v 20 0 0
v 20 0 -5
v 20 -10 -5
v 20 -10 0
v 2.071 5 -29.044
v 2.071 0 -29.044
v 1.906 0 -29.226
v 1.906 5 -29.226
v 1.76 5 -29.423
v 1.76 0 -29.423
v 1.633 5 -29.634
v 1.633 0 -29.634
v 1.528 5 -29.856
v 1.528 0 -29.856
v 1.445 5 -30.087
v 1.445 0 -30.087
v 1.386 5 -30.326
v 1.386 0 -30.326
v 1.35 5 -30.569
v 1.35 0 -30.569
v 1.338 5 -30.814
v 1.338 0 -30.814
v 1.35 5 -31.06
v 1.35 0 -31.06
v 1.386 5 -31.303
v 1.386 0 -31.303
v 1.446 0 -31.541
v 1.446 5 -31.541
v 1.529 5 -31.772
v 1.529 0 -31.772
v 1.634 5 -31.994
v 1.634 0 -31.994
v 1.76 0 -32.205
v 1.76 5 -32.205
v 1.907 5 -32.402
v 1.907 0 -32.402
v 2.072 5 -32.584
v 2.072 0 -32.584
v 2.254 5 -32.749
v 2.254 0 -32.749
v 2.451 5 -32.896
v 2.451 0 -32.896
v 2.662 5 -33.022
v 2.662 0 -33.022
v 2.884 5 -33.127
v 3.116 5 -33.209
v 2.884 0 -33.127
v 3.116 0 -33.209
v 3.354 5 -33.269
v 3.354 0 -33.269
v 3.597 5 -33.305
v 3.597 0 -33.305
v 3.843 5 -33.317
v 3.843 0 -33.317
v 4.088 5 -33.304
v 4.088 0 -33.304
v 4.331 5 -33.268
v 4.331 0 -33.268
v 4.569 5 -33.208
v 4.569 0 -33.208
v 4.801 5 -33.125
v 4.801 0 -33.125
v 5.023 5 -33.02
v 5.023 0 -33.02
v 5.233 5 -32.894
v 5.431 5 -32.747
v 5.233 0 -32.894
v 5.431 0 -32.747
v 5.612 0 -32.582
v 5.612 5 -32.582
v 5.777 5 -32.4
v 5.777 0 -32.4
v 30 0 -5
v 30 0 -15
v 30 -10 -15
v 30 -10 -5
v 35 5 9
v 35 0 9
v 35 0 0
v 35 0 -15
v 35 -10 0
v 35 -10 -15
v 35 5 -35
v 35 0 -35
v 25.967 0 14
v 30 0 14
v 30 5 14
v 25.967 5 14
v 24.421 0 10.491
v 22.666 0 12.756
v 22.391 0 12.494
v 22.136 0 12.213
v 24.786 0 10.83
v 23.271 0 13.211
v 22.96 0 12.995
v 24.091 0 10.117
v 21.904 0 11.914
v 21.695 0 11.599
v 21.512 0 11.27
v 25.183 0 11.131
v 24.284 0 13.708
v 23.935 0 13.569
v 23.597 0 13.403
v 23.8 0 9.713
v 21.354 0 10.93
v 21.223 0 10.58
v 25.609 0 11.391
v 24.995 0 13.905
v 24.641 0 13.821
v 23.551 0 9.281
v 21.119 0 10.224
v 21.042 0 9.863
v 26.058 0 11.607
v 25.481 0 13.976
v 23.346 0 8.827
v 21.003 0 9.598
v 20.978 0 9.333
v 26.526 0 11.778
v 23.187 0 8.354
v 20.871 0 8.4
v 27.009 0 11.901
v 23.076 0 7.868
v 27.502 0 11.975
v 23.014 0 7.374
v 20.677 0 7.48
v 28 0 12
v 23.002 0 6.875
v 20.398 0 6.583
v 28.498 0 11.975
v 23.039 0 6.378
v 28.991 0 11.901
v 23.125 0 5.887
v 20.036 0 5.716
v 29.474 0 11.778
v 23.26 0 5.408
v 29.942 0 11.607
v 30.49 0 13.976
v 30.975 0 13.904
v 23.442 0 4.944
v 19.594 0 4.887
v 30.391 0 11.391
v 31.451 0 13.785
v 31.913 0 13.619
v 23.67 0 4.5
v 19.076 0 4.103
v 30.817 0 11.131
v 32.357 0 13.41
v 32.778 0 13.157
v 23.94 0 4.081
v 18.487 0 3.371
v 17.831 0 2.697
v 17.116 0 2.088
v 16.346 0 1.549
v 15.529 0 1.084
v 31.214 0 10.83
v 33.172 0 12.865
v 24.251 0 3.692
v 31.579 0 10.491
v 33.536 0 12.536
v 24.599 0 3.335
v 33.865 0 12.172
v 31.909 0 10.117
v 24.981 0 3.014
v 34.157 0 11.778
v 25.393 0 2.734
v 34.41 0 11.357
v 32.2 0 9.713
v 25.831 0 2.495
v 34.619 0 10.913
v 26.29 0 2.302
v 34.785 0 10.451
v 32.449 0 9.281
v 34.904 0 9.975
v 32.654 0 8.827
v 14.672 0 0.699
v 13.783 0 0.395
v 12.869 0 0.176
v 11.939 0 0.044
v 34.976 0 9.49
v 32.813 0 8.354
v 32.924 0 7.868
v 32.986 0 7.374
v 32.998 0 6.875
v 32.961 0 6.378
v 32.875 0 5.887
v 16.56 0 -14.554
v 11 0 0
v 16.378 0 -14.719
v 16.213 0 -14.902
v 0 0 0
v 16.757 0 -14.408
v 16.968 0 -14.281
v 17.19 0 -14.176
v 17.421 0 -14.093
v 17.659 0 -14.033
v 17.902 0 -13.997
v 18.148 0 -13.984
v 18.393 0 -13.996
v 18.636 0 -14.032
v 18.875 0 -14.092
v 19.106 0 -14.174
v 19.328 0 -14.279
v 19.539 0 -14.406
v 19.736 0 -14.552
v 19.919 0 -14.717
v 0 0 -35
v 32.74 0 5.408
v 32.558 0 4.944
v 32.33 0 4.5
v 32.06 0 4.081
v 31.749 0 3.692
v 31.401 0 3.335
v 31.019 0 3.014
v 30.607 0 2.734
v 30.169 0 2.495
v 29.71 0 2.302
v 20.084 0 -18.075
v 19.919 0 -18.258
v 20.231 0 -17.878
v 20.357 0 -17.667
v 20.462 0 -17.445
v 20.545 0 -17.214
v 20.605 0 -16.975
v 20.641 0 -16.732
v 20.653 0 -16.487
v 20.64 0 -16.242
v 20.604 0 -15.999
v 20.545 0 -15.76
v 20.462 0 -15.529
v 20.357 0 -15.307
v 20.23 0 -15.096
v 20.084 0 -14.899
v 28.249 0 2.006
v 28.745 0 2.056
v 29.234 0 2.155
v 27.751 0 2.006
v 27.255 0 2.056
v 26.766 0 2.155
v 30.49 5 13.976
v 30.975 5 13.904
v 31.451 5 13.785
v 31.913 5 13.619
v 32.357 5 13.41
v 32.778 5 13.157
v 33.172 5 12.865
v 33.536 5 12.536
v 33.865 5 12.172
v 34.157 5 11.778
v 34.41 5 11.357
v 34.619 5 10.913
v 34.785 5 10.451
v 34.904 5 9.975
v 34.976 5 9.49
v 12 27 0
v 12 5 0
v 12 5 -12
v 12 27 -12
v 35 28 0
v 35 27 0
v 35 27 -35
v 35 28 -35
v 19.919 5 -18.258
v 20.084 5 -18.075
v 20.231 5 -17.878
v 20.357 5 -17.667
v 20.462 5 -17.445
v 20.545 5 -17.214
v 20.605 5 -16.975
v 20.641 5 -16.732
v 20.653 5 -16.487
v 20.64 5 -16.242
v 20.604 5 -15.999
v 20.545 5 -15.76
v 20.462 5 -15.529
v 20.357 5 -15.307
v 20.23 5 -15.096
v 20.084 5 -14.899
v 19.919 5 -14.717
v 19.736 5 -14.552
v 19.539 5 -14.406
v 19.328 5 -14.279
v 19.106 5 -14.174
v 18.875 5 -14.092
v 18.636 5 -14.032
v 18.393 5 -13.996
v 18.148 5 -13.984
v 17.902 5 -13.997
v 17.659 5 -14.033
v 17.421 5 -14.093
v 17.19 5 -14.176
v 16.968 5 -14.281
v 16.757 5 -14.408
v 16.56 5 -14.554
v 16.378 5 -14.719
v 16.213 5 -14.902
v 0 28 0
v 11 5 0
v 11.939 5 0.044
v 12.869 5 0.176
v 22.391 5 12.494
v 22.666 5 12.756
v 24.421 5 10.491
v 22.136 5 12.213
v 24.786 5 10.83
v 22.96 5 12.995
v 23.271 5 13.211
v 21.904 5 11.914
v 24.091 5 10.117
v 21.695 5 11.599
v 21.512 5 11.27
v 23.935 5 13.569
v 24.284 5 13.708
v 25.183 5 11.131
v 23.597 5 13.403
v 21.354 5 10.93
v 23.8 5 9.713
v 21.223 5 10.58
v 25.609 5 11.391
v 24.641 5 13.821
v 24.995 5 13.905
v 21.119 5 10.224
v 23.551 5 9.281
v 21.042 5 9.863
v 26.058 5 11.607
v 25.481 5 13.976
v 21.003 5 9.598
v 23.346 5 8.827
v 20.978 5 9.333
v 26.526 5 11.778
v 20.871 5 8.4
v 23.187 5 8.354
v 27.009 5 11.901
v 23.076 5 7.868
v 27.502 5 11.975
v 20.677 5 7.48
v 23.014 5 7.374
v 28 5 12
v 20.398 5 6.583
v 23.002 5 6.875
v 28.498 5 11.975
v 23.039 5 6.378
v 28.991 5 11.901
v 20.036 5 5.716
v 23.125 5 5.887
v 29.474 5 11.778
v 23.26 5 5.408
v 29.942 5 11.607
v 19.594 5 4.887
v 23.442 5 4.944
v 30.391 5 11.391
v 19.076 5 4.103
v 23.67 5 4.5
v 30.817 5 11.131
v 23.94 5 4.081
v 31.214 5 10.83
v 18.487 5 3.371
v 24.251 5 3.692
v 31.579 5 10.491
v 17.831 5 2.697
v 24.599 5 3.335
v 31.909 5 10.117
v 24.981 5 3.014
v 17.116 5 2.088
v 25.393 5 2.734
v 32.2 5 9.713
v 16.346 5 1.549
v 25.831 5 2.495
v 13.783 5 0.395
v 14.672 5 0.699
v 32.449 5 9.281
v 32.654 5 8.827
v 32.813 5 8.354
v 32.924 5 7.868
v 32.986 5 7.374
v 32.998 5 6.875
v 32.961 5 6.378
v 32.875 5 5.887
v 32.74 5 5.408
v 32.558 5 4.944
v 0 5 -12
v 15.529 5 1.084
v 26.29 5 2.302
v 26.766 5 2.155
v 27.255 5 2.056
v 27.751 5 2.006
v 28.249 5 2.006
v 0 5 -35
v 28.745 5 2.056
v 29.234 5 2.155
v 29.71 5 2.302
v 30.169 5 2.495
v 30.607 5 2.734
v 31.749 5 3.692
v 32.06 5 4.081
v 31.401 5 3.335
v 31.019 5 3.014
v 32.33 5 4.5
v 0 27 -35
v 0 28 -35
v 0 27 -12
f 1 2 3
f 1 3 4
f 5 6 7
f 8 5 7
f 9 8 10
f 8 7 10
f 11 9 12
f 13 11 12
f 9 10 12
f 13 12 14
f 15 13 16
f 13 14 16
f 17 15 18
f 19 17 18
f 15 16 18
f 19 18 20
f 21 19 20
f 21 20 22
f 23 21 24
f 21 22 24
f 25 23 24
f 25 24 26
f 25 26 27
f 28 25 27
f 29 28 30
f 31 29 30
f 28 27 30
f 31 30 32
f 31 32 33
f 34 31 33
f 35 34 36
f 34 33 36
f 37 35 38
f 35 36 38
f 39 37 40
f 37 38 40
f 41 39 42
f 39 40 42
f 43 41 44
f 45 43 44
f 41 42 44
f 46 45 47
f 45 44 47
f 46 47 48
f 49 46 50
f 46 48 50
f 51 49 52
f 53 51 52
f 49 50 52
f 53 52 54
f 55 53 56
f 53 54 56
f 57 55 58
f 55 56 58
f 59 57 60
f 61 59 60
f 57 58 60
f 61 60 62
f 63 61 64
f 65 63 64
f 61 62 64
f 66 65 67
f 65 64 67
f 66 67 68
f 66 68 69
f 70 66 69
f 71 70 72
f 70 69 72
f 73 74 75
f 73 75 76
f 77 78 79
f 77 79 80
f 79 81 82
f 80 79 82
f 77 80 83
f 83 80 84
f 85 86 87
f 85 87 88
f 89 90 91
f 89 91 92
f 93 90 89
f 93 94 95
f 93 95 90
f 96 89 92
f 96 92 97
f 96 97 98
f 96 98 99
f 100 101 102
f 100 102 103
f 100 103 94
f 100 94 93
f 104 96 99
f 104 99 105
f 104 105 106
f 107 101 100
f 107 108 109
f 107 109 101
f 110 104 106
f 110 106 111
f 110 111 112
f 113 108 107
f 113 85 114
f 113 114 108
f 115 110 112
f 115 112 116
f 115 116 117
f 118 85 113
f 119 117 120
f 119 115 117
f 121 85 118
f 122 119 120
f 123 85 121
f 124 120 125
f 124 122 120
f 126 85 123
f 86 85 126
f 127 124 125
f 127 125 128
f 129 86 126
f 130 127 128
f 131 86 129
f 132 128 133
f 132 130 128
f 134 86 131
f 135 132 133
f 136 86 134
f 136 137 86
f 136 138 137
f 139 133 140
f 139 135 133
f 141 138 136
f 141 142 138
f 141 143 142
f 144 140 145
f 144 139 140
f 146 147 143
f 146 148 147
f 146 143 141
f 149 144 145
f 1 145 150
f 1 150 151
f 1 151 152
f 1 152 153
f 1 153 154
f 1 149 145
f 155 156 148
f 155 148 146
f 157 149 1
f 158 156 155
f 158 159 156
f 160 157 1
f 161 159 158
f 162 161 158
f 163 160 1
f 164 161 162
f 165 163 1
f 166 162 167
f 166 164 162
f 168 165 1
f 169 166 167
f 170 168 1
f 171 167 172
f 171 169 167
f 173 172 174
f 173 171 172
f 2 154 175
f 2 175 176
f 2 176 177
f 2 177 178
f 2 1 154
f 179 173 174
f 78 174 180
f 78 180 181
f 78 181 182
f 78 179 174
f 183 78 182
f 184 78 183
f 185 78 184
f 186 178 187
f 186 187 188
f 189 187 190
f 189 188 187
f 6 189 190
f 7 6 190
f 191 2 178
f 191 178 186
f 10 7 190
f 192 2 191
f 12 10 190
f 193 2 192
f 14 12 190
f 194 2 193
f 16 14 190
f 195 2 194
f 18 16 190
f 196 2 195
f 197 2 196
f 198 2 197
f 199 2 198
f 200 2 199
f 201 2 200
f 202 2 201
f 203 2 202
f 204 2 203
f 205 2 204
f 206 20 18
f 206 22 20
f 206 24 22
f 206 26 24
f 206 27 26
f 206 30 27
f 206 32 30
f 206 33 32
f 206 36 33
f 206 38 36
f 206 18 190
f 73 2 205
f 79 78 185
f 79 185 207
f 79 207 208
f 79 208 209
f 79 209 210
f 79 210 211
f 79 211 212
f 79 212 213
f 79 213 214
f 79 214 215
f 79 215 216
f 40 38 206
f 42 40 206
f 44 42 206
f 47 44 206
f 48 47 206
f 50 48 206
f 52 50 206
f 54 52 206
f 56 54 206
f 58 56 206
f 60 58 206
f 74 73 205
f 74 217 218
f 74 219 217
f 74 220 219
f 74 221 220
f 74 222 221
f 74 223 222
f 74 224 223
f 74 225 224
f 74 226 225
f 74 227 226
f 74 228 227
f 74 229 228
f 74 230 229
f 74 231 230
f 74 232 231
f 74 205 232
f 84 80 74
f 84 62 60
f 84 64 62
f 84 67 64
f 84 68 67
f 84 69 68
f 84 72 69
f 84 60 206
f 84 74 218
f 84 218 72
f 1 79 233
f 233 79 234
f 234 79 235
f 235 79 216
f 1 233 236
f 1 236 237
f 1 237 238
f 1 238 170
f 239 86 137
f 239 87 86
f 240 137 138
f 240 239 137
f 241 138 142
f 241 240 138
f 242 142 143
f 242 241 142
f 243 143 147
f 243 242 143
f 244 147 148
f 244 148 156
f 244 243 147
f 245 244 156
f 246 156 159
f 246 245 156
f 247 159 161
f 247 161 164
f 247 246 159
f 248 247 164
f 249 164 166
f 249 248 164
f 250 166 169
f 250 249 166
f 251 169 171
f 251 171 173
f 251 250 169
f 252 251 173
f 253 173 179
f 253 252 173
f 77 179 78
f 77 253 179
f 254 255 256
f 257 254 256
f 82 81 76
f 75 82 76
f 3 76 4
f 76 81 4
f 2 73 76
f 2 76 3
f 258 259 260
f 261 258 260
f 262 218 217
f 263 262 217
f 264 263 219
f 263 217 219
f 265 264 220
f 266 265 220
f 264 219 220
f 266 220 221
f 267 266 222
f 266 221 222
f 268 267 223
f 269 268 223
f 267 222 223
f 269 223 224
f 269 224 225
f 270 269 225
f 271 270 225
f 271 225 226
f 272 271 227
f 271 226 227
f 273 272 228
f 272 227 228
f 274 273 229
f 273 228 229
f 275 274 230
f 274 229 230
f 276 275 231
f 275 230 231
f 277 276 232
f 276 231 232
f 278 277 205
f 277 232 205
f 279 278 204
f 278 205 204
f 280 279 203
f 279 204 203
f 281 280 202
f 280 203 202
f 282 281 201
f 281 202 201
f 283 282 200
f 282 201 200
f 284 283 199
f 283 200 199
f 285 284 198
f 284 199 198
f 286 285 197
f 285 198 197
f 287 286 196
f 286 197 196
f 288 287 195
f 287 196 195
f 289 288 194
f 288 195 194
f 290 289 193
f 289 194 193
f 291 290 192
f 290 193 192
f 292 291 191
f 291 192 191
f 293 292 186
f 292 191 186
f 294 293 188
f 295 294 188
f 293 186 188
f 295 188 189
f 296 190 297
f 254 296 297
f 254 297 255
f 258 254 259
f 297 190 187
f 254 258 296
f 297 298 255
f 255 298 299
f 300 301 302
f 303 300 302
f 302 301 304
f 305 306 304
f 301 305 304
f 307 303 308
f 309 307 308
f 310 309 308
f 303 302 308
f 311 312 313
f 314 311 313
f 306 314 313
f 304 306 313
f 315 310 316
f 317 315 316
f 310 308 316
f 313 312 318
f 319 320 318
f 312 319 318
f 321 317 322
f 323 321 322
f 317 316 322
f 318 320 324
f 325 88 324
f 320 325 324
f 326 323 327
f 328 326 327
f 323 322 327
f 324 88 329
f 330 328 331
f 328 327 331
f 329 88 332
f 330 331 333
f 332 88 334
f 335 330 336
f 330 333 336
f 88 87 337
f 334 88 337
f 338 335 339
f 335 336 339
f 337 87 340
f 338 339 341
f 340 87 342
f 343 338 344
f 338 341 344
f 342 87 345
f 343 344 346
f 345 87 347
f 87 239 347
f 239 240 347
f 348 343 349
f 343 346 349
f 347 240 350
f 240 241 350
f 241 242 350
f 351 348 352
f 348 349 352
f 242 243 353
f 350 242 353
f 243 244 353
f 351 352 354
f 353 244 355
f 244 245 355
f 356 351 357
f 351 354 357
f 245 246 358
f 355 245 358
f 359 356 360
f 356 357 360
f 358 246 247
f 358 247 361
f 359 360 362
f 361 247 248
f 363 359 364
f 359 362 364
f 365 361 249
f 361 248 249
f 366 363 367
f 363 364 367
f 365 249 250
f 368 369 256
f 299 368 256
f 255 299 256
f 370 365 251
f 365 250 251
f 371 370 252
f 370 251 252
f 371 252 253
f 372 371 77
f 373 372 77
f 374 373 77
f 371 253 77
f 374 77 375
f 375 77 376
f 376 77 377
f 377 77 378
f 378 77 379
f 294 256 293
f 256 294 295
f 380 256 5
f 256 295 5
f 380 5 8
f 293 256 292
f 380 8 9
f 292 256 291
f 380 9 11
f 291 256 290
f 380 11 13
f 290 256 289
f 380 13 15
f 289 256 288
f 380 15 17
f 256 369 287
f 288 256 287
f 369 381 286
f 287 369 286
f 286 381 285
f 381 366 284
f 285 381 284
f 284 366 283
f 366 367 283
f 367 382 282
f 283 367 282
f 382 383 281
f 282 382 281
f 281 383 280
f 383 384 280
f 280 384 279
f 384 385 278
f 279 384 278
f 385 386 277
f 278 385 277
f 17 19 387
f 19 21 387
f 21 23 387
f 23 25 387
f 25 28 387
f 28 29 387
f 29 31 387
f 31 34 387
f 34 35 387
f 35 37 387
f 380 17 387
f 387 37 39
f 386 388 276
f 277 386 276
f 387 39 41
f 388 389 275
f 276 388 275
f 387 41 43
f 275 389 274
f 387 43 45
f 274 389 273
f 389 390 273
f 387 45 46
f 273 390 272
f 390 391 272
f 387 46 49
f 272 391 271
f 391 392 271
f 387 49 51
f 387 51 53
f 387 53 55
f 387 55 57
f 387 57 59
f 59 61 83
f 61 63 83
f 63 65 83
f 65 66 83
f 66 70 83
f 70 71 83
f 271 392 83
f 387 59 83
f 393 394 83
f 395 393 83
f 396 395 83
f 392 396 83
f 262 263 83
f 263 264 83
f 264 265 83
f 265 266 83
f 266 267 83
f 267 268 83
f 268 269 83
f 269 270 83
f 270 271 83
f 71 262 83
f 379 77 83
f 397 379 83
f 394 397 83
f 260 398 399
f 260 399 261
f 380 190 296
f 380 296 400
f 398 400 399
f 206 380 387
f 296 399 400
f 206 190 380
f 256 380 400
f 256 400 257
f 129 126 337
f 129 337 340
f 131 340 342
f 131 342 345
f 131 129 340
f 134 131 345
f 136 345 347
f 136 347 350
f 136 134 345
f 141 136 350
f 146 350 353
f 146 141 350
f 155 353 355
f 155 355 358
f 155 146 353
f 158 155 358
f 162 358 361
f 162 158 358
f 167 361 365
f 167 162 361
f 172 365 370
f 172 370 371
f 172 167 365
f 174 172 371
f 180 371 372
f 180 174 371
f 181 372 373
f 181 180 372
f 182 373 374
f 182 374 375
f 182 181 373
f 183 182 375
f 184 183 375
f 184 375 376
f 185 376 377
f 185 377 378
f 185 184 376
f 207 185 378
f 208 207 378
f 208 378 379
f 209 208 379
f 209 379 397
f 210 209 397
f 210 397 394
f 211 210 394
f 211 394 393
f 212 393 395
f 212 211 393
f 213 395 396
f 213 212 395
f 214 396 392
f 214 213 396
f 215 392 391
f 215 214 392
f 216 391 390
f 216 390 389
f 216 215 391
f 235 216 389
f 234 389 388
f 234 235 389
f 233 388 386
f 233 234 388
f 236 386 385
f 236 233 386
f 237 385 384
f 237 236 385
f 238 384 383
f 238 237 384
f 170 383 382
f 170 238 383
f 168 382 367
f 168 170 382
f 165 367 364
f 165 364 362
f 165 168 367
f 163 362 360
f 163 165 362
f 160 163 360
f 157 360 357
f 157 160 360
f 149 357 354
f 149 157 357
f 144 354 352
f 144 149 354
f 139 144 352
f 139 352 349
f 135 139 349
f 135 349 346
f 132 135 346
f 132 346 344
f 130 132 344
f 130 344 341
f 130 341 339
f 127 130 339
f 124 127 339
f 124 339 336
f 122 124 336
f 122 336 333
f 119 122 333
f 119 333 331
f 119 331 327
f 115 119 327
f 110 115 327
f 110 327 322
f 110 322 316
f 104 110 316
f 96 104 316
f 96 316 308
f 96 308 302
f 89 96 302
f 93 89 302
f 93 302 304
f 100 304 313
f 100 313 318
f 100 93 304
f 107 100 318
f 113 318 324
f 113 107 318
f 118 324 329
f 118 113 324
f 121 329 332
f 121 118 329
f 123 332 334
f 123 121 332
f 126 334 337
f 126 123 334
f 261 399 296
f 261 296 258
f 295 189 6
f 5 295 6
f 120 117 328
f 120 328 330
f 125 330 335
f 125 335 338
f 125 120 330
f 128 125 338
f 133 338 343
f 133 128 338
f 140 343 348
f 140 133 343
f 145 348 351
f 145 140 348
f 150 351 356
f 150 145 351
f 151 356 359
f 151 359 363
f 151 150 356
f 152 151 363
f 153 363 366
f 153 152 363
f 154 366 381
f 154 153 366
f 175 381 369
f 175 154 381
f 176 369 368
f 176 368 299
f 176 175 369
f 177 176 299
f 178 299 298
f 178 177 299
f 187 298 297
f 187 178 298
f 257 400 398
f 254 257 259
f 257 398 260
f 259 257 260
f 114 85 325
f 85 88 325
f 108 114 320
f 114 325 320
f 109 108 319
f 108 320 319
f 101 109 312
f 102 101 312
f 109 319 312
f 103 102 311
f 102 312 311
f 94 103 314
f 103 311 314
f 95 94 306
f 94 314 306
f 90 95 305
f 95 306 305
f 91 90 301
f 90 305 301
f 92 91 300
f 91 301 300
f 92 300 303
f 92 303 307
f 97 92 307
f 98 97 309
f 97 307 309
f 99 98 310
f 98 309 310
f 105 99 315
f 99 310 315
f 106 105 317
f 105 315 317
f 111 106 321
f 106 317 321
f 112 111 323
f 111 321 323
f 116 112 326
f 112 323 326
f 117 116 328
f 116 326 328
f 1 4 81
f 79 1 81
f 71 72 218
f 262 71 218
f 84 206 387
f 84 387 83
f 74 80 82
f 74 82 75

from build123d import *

# Parameters (mm, degrees)
SKETCH1_R           = 5
BOSS_EXTRUDE1_DEPTH = 5
BOSS_EXTRUDE2_DEPTH = 10
SKETCH3_W           = 12
SKETCH3_H           = 12
BOSS_EXTRUDE3_DEPTH = 22
SKETCH4_W           = 35
SKETCH4_H           = 35
BOSS_EXTRUDE4_DEPTH = 1
FILLET1_R           = 10
FILLET4_R           = 5


with BuildPart() as part:
    # Sketch1 → Boss-Extrude1 (new body)
    with BuildSketch(Plane(origin=(0, 0, 0), x_dir=(1, 0, 0), z_dir=(0, 1, 0))):
        Polygon((0, 0), (0, 35), (35, 35), (35, 0), (35, -14), (21, -14), (21, 0), align=None)
        with Locations(Location((28, -7, 0), (0, 0, 270))):
            Circle(SKETCH1_R, mode=Mode.SUBTRACT)
        with BuildLine():
            Line((5.77728435, 32.399644503), (19.919419974, 18.257508879))
            ThreePointArc((19.919419974, 18.257508879), (19.829534471, 14.632089471), (16.21302376, 14.901525103))
            Line((16.21302376, 14.901525103), (2.070888136, 29.043660727))
            ThreePointArc((2.070888136, 29.043660727), (2.160773638, 32.669080135), (5.77728435, 32.399644503))
        make_face(mode=Mode.SUBTRACT)
    extrude(amount=BOSS_EXTRUDE1_DEPTH)

    # Sketch2 → Boss-Extrude2 (add)
    with BuildSketch(Plane.XZ):
        Polygon((30, -5), (20, -5), (20, 0), (35, 0), (35, -15), (30, -15), align=None)
    extrude(amount=BOSS_EXTRUDE2_DEPTH)

    # Sketch3 → Boss-Extrude3 (add)
    with BuildSketch(Plane(origin=(0, 5, 0), x_dir=(1, 0, 0), z_dir=(0, 1, 0))):
        with Locations((6, 6)):
            Rectangle(SKETCH3_W, SKETCH3_H)
    extrude(amount=BOSS_EXTRUDE3_DEPTH)

    # Sketch4 → Boss-Extrude4 (add)
    with BuildSketch(Plane(origin=(0, 27, 0), x_dir=(1, 0, 0), z_dir=(0, 1, 0))):
        with Locations((17.5, 17.5)):
            Rectangle(SKETCH4_W, SKETCH4_H)
    extrude(amount=BOSS_EXTRUDE4_DEPTH)

    # Fillet1
    # the kernel refuses this fillet: 10 mm, written as the material it adds along each edge
    with BuildSketch(Plane(origin=(21, 0, 0), x_dir=(0, 0, 1), z_dir=(0, 1, 0))) as fillet1_piece_1:
        with BuildLine():
            CenterArc((FILLET1_R, -FILLET1_R), FILLET1_R, 90, 90)
            Line((0, -FILLET1_R), (0, 0))
            Line((0, 0), (FILLET1_R, 0))
        make_face()
    extrude(amount=5)

    # Fillet4
    fillet4_edges = [part.edges().sort_by_distance(p)[0] for p in [
        (35, 2.5, 14),
        (21, 2.5, 14),
    ]]
    fillet(fillet4_edges, radius=FILLET4_R)


solid = part.part
